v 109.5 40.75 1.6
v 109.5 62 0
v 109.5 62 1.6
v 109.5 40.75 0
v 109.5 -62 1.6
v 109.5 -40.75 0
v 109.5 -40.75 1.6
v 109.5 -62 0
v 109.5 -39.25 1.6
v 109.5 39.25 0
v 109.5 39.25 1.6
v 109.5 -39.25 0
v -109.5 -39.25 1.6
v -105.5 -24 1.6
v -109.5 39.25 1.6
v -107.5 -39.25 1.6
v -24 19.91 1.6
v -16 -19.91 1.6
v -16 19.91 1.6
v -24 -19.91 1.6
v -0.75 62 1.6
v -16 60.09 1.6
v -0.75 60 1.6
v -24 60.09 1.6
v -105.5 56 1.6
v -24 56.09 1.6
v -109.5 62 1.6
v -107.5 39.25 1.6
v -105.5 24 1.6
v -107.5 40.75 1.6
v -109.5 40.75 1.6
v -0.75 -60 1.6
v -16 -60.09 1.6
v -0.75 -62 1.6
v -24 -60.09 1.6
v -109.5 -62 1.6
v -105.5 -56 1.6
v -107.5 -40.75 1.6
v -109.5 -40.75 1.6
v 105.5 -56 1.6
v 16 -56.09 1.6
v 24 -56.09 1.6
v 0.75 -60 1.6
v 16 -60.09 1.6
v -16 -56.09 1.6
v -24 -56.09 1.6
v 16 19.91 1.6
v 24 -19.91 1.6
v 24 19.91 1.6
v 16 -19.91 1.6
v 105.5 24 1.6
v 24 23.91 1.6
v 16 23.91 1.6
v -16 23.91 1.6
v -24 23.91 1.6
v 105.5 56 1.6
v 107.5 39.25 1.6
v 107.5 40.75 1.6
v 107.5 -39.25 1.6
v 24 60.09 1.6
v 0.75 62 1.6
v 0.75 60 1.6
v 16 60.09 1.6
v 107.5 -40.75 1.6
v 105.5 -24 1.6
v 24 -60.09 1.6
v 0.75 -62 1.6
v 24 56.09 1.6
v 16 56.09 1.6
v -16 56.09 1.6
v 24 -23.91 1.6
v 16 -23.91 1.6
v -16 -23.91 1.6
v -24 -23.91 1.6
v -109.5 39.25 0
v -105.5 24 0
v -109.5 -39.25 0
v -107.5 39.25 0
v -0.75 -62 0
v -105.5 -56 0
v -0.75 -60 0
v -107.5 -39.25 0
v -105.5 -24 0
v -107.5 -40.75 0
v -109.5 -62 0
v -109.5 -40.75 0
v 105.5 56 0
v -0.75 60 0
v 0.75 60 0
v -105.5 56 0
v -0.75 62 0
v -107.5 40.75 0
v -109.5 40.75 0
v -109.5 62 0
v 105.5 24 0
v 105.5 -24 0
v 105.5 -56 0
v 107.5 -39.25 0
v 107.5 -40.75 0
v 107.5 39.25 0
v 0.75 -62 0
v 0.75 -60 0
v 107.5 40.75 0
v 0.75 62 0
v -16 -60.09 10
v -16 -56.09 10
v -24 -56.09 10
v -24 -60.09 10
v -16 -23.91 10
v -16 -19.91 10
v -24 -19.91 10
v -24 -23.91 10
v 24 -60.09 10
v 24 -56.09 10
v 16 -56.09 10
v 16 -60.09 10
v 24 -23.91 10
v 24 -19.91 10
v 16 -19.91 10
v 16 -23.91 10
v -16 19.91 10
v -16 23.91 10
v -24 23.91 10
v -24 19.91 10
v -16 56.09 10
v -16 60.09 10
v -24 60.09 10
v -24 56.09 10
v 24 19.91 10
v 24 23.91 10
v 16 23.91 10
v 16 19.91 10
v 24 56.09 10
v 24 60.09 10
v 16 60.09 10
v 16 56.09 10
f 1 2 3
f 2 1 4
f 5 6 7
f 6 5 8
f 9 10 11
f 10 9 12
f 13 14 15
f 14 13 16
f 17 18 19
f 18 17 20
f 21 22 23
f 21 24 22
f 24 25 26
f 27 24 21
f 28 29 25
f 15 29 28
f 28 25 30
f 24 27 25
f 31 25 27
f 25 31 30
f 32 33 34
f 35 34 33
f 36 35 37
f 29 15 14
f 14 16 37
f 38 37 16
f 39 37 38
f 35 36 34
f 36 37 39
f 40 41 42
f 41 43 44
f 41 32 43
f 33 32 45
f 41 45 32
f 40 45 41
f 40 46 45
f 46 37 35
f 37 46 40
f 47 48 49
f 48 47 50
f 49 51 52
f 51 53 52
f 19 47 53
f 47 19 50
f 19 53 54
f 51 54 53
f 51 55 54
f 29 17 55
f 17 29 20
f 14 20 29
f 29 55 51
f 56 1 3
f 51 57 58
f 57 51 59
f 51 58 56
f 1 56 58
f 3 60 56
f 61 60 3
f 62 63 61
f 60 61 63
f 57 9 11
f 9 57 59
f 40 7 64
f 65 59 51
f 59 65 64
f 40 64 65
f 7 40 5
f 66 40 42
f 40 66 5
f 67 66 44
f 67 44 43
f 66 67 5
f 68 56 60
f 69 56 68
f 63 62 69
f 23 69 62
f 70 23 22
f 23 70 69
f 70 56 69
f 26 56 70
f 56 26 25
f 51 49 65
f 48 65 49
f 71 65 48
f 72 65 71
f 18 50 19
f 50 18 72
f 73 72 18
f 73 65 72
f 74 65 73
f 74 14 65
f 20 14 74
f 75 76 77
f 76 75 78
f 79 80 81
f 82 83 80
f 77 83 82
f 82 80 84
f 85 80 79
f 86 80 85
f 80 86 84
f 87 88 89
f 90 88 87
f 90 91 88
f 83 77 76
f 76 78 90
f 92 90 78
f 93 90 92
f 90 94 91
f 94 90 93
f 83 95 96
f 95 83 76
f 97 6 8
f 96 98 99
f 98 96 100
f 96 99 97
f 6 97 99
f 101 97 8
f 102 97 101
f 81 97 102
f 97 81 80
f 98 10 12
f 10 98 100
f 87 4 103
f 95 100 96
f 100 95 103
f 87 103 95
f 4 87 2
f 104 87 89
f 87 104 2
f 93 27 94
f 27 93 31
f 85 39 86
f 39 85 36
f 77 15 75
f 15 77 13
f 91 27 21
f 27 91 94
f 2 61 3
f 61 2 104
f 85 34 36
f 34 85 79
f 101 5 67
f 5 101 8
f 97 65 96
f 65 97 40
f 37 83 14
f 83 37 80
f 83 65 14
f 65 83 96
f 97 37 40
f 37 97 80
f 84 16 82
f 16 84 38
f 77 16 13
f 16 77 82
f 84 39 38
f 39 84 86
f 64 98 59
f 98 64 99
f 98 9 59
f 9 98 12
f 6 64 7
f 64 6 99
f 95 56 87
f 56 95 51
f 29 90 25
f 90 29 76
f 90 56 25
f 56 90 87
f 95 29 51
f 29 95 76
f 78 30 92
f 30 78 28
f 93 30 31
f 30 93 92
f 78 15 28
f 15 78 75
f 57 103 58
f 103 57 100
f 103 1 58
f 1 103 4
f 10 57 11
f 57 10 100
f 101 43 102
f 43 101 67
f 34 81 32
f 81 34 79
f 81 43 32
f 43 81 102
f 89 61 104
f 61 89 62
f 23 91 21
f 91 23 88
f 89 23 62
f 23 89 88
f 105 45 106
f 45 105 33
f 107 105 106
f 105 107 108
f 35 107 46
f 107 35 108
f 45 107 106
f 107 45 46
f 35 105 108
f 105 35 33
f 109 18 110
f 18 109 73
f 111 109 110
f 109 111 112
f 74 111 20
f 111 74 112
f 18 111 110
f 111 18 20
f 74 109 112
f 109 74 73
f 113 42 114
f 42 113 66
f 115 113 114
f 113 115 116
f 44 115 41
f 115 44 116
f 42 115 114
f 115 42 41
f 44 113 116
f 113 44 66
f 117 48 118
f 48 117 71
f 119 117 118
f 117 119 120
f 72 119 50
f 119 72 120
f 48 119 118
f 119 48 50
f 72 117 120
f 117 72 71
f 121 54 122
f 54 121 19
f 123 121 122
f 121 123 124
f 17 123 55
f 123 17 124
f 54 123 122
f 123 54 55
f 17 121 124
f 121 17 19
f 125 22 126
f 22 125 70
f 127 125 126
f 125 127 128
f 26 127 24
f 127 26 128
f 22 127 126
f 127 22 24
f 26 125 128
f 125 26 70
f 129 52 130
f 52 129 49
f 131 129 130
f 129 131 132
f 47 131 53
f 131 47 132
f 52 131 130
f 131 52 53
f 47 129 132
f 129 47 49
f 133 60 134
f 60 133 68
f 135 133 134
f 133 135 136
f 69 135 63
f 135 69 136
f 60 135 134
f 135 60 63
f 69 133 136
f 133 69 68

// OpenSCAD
// Generated by build_vial_holder.py -- edit the Python parameters, then rerun.
// Units mm. Origin = holder centre, vial axis along +X.
// half = true gives one of two identical halves (cut at x = 0).
half = false;
intersection() {
  union() {
    difference() {
      union() {
      translate([-109.500,-62.000,0]) cube([219.000,124.000,1.6]);
      }
      translate([-105.500,-56.000,-1]) cube([211.000,32.000,4.6]);
      translate([-109.500,-40.750,-1]) cube([2.000,1.500,4.6]);
      translate([107.500,-40.750,-1]) cube([2.000,1.500,4.6]);
      translate([-105.500,24.000,-1]) cube([211.000,32.000,4.6]);
      translate([-109.500,39.250,-1]) cube([2.000,1.500,4.6]);
      translate([107.500,39.250,-1]) cube([2.000,1.500,4.6]);
      translate([-0.750,-62.000,-1]) cube([1.500,2.000,4.6]);
      translate([-0.750,60.000,-1]) cube([1.500,2.000,4.6]);
    }
    translate([-24.000,-60.090,0]) cube([8.000,4.000,10.0]);
    translate([-24.000,-23.910,0]) cube([8.000,4.000,10.0]);
    translate([16.000,-60.090,0]) cube([8.000,4.000,10.0]);
    translate([16.000,-23.910,0]) cube([8.000,4.000,10.0]);
    translate([-24.000,19.910,0]) cube([8.000,4.000,10.0]);
    translate([-24.000,56.090,0]) cube([8.000,4.000,10.0]);
    translate([16.000,19.910,0]) cube([8.000,4.000,10.0]);
    translate([16.000,56.090,0]) cube([8.000,4.000,10.0]);
  }
  if (half) translate([0,-200,-1]) cube([400,400,50]);
  else translate([-200,-200,-1]) cube([400,400,50]);
}
